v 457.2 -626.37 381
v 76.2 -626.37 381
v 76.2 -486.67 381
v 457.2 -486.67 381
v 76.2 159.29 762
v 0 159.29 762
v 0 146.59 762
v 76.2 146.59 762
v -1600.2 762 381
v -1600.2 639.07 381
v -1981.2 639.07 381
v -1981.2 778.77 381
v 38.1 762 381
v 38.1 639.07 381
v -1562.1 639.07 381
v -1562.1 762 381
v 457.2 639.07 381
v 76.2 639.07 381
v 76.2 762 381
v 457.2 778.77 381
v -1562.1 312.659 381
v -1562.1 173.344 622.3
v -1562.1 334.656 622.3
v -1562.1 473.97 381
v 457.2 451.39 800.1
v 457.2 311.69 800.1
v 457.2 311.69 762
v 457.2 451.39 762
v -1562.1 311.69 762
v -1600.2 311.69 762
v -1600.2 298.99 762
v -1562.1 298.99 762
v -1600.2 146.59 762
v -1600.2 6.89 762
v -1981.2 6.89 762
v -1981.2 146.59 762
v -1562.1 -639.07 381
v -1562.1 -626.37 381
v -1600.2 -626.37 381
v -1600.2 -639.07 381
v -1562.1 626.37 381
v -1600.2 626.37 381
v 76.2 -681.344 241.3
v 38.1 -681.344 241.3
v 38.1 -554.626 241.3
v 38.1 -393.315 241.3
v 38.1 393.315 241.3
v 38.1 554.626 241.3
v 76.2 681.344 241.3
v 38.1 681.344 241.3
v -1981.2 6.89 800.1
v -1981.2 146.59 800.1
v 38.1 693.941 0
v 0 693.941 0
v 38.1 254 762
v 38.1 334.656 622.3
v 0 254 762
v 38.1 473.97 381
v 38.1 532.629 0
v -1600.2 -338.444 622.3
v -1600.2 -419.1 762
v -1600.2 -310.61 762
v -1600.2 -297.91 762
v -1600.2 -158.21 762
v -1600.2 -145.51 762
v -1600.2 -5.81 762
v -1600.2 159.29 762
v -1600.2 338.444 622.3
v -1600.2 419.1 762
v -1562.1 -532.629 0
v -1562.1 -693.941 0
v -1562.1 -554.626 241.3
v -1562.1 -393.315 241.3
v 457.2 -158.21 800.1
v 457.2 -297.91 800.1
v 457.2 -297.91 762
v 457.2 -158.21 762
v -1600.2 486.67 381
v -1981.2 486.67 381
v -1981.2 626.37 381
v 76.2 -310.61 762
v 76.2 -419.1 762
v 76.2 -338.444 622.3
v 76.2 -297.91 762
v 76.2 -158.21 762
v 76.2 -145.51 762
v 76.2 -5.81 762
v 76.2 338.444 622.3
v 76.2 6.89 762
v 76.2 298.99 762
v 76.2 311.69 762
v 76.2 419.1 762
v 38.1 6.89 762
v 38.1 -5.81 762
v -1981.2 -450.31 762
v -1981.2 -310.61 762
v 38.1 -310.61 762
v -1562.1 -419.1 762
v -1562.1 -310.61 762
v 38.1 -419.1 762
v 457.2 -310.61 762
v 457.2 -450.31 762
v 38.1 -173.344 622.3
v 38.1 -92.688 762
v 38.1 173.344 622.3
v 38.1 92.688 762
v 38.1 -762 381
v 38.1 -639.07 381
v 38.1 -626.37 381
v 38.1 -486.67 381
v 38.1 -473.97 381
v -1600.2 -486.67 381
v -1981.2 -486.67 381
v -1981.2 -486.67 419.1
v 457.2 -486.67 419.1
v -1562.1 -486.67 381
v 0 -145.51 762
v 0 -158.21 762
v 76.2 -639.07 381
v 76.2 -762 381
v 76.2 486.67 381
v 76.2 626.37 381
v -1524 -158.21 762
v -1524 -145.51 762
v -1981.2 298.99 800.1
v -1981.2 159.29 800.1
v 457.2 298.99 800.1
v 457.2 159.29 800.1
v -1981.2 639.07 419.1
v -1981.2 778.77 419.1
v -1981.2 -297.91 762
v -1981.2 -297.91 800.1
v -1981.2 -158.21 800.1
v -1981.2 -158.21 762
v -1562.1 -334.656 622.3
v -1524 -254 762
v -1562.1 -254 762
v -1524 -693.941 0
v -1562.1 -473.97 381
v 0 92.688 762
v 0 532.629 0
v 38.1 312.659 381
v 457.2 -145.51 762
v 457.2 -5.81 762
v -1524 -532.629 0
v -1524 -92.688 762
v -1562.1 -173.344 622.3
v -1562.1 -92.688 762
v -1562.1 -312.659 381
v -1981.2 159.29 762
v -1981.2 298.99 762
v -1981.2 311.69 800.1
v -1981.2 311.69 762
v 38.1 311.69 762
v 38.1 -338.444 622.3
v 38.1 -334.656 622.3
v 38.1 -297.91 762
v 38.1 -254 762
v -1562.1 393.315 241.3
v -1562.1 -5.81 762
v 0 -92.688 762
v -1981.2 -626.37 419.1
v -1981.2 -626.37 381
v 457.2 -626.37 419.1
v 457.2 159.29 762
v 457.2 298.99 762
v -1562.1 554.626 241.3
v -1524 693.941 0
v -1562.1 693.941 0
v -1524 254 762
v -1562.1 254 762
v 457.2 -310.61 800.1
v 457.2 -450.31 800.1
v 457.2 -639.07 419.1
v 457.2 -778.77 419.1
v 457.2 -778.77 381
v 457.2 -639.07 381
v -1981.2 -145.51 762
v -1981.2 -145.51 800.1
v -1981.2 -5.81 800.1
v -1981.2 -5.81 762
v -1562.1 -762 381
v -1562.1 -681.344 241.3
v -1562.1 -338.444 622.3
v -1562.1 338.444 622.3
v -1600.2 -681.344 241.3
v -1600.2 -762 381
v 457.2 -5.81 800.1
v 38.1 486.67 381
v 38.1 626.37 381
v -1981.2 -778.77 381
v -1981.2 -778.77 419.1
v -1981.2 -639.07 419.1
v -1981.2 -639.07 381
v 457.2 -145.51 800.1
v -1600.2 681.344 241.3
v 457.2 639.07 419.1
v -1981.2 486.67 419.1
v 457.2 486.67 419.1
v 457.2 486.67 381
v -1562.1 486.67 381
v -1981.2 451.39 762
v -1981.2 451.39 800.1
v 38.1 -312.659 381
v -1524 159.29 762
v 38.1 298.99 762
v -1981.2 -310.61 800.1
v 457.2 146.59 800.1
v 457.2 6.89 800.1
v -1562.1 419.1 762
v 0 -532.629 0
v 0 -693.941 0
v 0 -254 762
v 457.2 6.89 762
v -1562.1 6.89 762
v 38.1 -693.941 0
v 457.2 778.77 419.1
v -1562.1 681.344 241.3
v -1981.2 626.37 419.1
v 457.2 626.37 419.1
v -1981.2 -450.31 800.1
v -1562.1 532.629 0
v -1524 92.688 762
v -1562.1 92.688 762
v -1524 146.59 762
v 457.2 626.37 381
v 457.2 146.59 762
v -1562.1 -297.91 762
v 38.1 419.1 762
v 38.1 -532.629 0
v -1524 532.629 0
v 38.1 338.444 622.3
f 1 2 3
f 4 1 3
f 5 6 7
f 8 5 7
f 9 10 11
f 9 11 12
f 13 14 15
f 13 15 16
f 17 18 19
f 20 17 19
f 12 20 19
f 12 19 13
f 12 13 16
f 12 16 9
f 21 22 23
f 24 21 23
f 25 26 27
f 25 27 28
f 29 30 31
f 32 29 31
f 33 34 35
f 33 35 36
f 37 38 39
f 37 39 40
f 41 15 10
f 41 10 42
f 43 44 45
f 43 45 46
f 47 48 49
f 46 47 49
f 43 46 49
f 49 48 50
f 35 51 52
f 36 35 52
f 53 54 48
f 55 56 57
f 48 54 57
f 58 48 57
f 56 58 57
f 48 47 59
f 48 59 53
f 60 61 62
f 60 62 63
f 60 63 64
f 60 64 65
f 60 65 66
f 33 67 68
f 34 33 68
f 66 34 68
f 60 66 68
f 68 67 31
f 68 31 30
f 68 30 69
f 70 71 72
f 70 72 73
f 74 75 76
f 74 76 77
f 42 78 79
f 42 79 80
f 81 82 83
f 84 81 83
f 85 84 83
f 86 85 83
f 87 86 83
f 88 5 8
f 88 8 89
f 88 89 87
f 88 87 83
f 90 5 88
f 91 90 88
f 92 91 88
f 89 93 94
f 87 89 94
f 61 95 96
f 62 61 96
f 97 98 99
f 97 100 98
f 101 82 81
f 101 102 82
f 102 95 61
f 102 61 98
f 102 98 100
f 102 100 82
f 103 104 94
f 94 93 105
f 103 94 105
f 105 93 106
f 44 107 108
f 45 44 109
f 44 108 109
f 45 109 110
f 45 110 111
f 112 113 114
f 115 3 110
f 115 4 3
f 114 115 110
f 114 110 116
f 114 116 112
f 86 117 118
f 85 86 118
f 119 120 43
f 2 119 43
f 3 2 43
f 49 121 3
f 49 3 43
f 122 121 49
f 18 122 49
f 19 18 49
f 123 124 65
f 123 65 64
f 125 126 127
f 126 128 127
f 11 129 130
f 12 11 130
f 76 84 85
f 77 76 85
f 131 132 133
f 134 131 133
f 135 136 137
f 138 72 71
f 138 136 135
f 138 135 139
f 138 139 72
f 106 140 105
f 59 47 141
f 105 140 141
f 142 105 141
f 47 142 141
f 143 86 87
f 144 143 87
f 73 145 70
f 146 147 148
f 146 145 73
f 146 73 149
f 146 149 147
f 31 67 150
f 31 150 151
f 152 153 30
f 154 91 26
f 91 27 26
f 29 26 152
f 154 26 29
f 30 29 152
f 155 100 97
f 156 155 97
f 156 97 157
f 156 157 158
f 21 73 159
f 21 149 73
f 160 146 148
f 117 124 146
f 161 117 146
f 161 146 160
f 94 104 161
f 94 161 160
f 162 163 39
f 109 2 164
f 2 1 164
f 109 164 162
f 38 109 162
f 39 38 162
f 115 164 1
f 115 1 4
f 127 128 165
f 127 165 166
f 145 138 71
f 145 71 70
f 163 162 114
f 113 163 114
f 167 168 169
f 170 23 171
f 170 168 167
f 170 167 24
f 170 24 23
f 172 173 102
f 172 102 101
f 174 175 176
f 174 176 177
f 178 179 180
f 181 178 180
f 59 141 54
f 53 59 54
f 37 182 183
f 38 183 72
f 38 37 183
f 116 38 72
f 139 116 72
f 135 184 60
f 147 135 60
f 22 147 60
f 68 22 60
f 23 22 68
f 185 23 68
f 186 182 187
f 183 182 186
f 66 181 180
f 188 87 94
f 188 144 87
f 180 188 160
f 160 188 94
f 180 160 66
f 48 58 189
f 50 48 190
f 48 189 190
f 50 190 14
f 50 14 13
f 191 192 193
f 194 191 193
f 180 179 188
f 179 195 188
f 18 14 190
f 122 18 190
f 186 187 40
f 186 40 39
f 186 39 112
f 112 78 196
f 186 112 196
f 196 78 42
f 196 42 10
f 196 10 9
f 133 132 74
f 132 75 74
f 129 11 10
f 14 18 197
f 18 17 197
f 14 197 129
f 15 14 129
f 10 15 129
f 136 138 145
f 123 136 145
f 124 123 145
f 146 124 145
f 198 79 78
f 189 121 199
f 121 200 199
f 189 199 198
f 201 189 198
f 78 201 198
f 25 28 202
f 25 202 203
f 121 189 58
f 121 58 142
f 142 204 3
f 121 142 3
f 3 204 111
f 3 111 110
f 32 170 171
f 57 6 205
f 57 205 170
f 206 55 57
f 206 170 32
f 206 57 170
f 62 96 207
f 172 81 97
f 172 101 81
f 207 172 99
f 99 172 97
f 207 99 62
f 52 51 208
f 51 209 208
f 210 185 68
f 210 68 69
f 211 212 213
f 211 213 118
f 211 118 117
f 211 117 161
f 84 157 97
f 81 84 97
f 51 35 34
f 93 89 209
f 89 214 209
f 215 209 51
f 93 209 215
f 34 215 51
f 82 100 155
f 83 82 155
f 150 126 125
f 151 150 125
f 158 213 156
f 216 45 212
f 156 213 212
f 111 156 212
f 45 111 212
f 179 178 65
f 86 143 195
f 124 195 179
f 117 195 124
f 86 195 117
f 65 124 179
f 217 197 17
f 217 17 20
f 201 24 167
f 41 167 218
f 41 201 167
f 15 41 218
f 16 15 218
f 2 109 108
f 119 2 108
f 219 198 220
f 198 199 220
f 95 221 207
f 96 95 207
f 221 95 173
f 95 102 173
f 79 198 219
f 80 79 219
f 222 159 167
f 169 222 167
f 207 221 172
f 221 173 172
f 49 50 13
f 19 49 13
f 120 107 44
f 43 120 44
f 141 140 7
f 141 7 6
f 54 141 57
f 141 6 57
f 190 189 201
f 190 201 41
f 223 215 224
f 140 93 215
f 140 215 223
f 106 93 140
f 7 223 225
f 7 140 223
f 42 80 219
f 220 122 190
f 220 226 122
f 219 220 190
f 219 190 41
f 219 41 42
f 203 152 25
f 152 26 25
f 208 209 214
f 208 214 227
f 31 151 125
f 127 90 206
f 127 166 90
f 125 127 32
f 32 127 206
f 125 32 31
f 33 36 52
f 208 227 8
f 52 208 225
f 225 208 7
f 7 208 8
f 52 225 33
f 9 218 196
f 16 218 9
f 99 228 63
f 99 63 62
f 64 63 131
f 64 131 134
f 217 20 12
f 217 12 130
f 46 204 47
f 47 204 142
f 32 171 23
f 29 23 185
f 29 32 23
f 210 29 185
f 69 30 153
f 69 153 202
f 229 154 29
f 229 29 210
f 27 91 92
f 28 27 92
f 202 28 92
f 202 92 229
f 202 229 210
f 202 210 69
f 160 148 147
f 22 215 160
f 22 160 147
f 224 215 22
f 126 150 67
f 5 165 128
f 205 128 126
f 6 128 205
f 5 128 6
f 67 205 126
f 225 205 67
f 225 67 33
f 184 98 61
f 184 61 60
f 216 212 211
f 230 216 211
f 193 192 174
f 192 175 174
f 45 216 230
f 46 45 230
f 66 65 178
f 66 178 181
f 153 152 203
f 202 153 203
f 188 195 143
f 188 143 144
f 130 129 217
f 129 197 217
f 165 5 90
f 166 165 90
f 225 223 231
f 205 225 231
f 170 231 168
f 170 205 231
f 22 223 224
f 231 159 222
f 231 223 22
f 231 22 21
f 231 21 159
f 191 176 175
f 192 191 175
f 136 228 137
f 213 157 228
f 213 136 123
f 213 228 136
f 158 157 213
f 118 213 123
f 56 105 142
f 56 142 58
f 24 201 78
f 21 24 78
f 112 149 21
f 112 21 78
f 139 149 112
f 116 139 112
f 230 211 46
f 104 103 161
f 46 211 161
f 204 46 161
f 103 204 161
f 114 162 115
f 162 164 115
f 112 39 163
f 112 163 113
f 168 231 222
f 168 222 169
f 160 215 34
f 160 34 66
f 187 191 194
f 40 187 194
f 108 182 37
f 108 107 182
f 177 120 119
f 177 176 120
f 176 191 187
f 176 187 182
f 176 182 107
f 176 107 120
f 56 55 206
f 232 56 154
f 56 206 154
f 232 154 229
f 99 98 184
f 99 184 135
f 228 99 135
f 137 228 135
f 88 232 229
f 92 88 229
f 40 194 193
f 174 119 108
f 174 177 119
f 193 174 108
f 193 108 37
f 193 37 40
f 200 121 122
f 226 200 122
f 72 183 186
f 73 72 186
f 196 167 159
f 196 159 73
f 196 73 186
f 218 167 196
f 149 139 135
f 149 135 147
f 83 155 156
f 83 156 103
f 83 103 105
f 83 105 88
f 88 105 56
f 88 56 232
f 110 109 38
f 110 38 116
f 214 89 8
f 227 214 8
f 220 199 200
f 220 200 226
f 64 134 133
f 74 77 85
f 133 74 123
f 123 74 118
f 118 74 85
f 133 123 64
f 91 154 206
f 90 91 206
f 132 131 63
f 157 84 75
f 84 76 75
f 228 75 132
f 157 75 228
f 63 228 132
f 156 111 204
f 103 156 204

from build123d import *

# Parameters (mm, degrees)
F1_DEPTH      = 38.1
F3_DEPTH      = 38.1
F4_W          = 139.7
F4_H          = 38.1
F5_DEPTH      = 381
F5_DEPTH_BACK = 2057.4


# Not quite as in the source:
# - a pattern or mirror of a feature is missing from the dataset's text; its kind, count and spacing are read off the source's solid


with BuildPart() as f1:
    # F0 (on Right) → F1 (new body)
    with BuildSketch(Plane.YZ):
        Polygon((-254, 762), (-693.9409051225, 0), (-532.6292399109, 0), (-92.6883347884, 762), align=None)
    extrude(amount=F1_DEPTH)


with BuildPart() as f1b:
    # F0 (on Right) → F1, piece 2 (new body)
    with BuildSketch(Plane.YZ):
        Polygon((254, 762), (92.6883347884, 762), (532.6292399109, 0), (693.9409051225, 0), align=None)
    extrude(amount=F1_DEPTH)


with BuildPart() as f1_copies_1:
    # F1_copies: instance of F1
    add(f1.part.mirror(Plane(origin=(-762, 0, 0), x_dir=(0, 0, -1), z_dir=(-1, 0, 0))))


with BuildPart() as f1_2_copies_1:
    # F1_2_copies: instance of F1b
    add(f1b.part.mirror(Plane(origin=(-762, 0, 0), x_dir=(0, 0, -1), z_dir=(-1, 0, 0))))


with BuildPart() as f1_1:
    add(f1.part)

    add(f1b.part)  # F3 merges F1b
    # F2 (on face) → F3 (join)
    with BuildSketch(Plane.YZ.offset(38.1)):
        Polygon((762, 381), (-762, 381), (-681.3441673942, 241.3), (681.3441673942, 241.3), align=None)
        Polygon((419.1, 762), (-419.1, 762), (-338.4441673942, 622.3), (338.4441673942, 622.3), align=None)
    f3 = extrude(amount=F3_DEPTH)

    # F3_copies: F3 across plane
    add(f3.mirror(Plane(origin=(-762, 0, 0), x_dir=(0, 0, -1), z_dir=(-1, 0, 0))))

    add(f1_copies_1.part)  # F5 merges F1_copies_1

    add(f1_2_copies_1.part)  # F5 merges F1_2_copies_1
    # F4 (on face) → F5 (join, two sides)
    with BuildSketch(Plane.YZ.offset(76.2)) as f5_sk:
        with Locations((-708.9204525612, 400.05)):
            Rectangle(F4_W, F4_H)
        with Locations((-556.5204525612, 400.05)):
            Rectangle(F4_W, F4_H)
        with Locations((556.5204525612, 400.05)):
            Rectangle(F4_W, F4_H)
        with Locations((708.9204525612, 400.05)):
            Rectangle(F4_W, F4_H)
        with Locations((-380.4596342087, 781.05)):
            Rectangle(F4_W, F4_H)
        with Locations((-228.0596342087, 781.05)):
            Rectangle(F4_W, F4_H)
        with Locations((-75.6596342087, 781.05)):
            Rectangle(F4_W, F4_H)
        with Locations((76.7403657913, 781.05)):
            Rectangle(F4_W, F4_H)
        with Locations((229.1403657913, 781.05)):
            Rectangle(F4_W, F4_H)
        with Locations((381.5403657913, 781.05)):
            Rectangle(F4_W, F4_H)
    extrude(amount=F5_DEPTH)
    extrude(f5_sk.sketch, amount=-F5_DEPTH_BACK)


solid = f1_1.part
